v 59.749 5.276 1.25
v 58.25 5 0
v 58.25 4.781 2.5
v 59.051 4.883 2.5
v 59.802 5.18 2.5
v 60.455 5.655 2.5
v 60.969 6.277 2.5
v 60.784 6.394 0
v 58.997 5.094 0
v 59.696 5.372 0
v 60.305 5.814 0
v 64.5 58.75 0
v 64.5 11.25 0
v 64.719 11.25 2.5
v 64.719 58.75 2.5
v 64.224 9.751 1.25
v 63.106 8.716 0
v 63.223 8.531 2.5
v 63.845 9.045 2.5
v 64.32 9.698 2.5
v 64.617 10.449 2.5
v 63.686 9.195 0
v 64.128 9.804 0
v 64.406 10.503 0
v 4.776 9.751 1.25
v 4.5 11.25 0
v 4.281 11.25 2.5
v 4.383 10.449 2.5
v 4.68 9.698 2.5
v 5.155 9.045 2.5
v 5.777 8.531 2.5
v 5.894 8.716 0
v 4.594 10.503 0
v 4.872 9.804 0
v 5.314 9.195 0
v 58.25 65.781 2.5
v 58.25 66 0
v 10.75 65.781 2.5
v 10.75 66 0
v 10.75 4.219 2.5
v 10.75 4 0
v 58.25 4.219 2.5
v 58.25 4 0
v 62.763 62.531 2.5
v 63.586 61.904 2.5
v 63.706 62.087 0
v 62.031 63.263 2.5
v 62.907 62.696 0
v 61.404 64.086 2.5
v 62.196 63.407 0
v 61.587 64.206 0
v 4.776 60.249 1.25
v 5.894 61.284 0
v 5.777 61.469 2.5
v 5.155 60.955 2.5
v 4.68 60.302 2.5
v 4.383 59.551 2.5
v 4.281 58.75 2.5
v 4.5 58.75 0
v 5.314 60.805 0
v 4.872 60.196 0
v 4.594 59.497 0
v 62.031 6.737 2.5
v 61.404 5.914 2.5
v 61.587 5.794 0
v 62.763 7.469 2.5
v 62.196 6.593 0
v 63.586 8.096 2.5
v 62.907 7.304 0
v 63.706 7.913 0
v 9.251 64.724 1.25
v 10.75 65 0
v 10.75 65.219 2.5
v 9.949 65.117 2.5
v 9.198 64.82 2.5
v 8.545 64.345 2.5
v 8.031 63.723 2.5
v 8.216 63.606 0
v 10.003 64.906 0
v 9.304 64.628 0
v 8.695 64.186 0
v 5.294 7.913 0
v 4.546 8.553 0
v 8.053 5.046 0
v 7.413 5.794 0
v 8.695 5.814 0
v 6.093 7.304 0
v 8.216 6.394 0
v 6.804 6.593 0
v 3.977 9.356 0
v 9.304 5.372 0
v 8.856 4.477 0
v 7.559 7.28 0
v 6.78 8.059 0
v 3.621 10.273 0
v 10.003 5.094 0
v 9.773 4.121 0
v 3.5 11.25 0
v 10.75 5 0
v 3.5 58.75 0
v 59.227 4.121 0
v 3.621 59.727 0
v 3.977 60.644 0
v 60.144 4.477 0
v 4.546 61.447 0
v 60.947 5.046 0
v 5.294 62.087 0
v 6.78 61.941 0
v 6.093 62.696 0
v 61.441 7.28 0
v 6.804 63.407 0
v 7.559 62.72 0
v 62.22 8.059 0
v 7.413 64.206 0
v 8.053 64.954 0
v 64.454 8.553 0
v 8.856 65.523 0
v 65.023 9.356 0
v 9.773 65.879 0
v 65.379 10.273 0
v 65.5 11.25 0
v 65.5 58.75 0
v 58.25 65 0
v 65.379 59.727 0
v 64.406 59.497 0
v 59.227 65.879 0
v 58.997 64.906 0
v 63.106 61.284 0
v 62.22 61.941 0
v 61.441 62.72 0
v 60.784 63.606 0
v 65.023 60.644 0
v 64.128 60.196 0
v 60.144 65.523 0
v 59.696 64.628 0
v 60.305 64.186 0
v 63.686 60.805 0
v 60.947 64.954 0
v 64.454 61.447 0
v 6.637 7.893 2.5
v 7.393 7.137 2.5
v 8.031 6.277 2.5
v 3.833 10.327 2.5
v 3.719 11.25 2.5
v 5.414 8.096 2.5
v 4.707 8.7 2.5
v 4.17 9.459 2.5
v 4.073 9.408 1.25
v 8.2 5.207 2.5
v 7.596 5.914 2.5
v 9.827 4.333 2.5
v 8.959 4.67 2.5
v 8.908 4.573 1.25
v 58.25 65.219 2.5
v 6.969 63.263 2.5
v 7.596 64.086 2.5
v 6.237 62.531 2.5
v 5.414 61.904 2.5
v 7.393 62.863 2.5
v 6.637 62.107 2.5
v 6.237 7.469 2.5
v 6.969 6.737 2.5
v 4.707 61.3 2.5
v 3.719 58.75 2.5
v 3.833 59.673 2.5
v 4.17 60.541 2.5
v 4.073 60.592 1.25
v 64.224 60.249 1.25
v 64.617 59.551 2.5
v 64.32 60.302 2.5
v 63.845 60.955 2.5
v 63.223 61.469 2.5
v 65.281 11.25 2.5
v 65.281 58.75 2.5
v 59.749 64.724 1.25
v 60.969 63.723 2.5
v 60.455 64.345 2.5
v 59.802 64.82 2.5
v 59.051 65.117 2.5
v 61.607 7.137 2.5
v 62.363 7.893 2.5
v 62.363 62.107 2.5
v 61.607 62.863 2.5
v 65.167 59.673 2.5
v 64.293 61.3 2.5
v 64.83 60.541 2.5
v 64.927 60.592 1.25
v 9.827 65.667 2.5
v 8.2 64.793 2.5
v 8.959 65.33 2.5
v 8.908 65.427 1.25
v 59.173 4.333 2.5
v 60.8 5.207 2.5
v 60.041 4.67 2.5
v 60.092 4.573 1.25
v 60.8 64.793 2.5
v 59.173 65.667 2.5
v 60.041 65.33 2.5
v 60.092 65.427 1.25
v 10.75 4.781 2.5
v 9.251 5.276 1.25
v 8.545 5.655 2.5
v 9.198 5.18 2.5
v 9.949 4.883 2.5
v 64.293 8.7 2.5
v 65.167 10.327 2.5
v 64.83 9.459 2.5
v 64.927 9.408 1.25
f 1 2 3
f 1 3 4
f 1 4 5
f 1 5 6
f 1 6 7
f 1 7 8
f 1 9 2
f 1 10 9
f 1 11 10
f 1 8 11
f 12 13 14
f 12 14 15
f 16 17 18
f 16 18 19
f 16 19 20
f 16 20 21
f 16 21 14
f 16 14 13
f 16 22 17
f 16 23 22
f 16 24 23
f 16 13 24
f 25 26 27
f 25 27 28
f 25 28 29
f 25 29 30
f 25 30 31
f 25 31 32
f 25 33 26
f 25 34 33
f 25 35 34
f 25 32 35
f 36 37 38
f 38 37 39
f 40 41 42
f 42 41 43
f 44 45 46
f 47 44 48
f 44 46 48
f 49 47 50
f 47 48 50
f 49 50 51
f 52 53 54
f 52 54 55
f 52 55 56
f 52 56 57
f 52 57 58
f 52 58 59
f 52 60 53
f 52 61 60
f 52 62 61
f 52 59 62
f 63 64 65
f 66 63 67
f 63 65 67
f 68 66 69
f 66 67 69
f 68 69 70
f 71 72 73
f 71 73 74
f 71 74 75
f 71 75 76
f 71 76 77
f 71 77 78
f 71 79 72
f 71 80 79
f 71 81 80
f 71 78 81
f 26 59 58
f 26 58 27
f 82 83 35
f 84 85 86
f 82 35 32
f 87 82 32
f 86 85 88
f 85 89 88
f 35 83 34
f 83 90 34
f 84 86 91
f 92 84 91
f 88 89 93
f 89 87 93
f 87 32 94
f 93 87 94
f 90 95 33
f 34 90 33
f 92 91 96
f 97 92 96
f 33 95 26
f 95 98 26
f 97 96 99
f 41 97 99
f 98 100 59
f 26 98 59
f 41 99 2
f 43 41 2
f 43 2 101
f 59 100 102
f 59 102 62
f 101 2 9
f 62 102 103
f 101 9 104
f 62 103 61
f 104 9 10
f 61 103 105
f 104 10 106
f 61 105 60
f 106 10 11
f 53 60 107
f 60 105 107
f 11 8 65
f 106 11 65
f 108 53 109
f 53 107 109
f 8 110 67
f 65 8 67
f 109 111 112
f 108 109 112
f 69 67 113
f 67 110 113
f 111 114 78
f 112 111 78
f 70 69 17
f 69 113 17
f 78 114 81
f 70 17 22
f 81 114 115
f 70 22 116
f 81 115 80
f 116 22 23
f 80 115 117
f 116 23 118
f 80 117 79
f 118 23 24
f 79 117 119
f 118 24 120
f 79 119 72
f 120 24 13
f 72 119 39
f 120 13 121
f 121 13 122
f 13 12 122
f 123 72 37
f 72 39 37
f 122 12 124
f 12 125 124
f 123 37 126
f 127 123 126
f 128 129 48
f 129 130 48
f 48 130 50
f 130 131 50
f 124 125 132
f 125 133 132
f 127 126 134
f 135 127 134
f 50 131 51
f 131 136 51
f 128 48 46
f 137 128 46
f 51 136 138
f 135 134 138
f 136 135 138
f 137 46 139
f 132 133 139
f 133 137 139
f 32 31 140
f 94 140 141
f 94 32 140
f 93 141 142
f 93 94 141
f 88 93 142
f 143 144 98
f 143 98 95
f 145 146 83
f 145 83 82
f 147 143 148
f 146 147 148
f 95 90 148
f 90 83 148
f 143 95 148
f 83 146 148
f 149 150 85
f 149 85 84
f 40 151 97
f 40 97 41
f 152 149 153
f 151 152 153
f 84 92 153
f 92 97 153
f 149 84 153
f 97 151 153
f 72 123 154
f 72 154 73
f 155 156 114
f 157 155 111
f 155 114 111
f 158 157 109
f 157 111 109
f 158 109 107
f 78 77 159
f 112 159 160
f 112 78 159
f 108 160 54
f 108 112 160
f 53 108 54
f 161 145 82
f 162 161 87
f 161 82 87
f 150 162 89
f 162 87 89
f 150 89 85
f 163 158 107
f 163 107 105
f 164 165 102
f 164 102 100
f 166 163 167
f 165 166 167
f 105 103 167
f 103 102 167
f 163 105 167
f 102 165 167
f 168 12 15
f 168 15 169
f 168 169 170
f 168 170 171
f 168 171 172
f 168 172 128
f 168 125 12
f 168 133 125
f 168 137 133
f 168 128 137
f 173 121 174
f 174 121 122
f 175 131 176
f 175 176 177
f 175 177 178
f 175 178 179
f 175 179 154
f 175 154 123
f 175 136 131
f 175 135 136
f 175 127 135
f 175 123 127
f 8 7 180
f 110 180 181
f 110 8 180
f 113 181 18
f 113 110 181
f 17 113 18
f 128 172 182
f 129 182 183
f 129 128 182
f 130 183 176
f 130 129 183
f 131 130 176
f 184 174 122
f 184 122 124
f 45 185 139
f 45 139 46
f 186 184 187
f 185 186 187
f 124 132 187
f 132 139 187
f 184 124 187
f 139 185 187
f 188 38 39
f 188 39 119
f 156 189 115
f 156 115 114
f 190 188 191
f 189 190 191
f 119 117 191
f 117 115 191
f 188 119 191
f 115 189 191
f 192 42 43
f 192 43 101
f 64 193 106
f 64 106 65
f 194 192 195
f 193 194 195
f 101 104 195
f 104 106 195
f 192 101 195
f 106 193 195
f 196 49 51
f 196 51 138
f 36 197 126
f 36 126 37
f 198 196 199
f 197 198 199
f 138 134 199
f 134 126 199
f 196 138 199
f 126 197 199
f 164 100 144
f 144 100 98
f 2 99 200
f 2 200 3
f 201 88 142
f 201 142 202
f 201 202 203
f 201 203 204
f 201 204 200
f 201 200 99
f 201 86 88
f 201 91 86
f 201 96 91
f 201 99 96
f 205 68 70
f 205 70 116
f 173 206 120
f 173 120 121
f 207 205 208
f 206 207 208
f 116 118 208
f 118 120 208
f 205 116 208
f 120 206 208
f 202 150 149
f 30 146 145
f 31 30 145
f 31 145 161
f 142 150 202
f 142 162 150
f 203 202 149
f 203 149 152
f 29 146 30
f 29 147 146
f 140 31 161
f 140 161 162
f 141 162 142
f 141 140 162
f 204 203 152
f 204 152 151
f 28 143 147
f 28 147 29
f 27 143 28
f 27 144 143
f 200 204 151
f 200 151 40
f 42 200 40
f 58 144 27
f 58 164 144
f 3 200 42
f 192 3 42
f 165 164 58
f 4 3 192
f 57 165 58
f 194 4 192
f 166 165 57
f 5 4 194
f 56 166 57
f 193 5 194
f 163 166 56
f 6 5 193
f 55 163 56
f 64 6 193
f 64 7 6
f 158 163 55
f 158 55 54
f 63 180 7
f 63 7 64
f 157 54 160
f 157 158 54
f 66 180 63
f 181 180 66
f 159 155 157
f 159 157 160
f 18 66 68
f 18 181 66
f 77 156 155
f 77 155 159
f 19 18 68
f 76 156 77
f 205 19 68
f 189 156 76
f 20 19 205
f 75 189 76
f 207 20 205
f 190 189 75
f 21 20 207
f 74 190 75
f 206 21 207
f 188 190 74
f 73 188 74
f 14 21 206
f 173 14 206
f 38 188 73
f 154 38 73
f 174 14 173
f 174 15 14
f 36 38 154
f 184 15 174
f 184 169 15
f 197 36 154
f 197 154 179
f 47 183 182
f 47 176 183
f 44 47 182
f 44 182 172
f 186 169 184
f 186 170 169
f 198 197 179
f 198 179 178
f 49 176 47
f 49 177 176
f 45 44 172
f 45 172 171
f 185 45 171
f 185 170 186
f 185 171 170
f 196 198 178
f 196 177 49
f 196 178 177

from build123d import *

# Parameters (mm, degrees)
BOSS_EXTRUDE1_DEPTH = 2.5
BOSS_EXTRUDE1_DRAFT = 5


with BuildPart() as part:
    # Sketch1 → Boss-Extrude1 (with draft: the straight prism first)
    with BuildSketch(Plane.XY):
        with BuildLine():
            Line((65.5, 11.25), (65.5, 58.75))
            ThreePointArc((65.5, 58.75), (65.023112089, 60.644117527), (63.706159397, 62.086594179))
            ThreePointArc((63.706159397, 62.086594179), (62.539407406, 63.039407406), (61.586594179, 64.206159397))
            ThreePointArc((61.586594179, 64.206159397), (60.144117527, 65.523112089), (58.25, 66))
            Line((58.25, 66), (10.75, 66))
            ThreePointArc((10.75, 66), (8.855882473, 65.523112089), (7.413405821, 64.206159397))
            ThreePointArc((7.413405821, 64.206159397), (6.460592594, 63.039407406), (5.293840603, 62.086594179))
            ThreePointArc((5.293840603, 62.086594179), (3.976887911, 60.644117527), (3.5, 58.75))
            Line((3.5, 58.75), (3.5, 11.25))
            ThreePointArc((3.5, 11.25), (3.976887911, 9.355882473), (5.293840603, 7.913405821))
            ThreePointArc((5.293840603, 7.913405821), (6.460592594, 6.960592594), (7.413405821, 5.793840603))
            ThreePointArc((7.413405821, 5.793840603), (8.855882473, 4.476887911), (10.75, 4))
            Line((10.75, 4), (58.25, 4))
            ThreePointArc((58.25, 4), (60.144117527, 4.476887911), (61.586594179, 5.793840603))
            ThreePointArc((61.586594179, 5.793840603), (62.539407406, 6.960592594), (63.706159397, 7.913405821))
            ThreePointArc((63.706159397, 7.913405821), (65.023112089, 9.355882473), (65.5, 11.25))
        make_face()
        with BuildLine():
            Line((64.5, 11.25), (64.5, 58.75))
            ThreePointArc((64.5, 58.75), (64.128384354, 60.196235004), (63.105602876, 61.284174304))
            ThreePointArc((63.105602876, 61.284174304), (61.816309207, 62.316309207), (60.784174304, 63.605602876))
            ThreePointArc((60.784174304, 63.605602876), (59.696235004, 64.628384354), (58.25, 65))
            Line((58.25, 65), (10.75, 65))
            ThreePointArc((10.75, 65), (9.303764996, 64.628384354), (8.215825696, 63.605602876))
            ThreePointArc((8.215825696, 63.605602876), (7.183690793, 62.316309207), (5.894397124, 61.284174304))
            ThreePointArc((5.894397124, 61.284174304), (4.871615646, 60.196235004), (4.5, 58.75))
            Line((4.5, 58.75), (4.5, 11.25))
            ThreePointArc((4.5, 11.25), (4.871615646, 9.803764996), (5.894397124, 8.715825696))
            ThreePointArc((5.894397124, 8.715825696), (7.183690793, 7.683690793), (8.215825696, 6.394397124))
            ThreePointArc((8.215825696, 6.394397124), (9.303764996, 5.371615646), (10.75, 5))
            Line((10.75, 5), (58.25, 5))
            ThreePointArc((58.25, 5), (59.696235004, 5.371615646), (60.784174304, 6.394397124))
            ThreePointArc((60.784174304, 6.394397124), (61.816309207, 7.683690793), (63.105602876, 8.715825696))
            ThreePointArc((63.105602876, 8.715825696), (64.128384354, 9.803764996), (64.5, 11.25))
        make_face(mode=Mode.SUBTRACT)
    extrude(amount=BOSS_EXTRUDE1_DEPTH)
    # Boss-Extrude1: the draft: its side faces are tilted about the plane it starts from
    boss_extrude1_sides = [part.faces().sort_by_distance(p)[0] for p in [
        (65.023112089, 9.355882473, 1.25),
        (65.5, 35, 1.25),
        (65.023112089, 60.644117527, 1.25),
        (62.539407406, 63.039407406, 1.25),
        (60.144117527, 65.523112089, 1.25),
        (34.5, 66, 1.25),
        (8.855882473, 65.523112089, 1.25),
        (6.460592594, 63.039407406, 1.25),
        (3.976887911, 60.644117527, 1.25),
        (3.5, 35, 1.25),
        (3.976887911, 9.355882473, 1.25),
        (6.460592594, 6.960592594, 1.25),
        (8.855882473, 4.476887911, 1.25),
        (34.5, 4, 1.25),
        (60.144117527, 4.476887911, 1.25),
        (62.539407406, 6.960592594, 1.25),
        (7.183690793, 7.683690793, 1.25),
        (4.871615646, 9.803764996, 1.25),
        (4.5, 35, 1.25),
        (4.871615646, 60.196235004, 1.25),
        (7.183690793, 62.316309207, 1.25),
        (9.303764996, 64.628384354, 1.25),
        (34.5, 65, 1.25),
        (59.696235004, 64.628384354, 1.25),
        (61.816309207, 62.316309207, 1.25),
        (64.128384354, 60.196235004, 1.25),
        (64.5, 35, 1.25),
        (64.128384354, 9.803764996, 1.25),
        (61.816309207, 7.683690793, 1.25),
        (59.696235004, 5.371615646, 1.25),
        (34.5, 5, 1.25),
        (9.303764996, 5.371615646, 1.25),
    ]]
    draft(boss_extrude1_sides, Plane.XY, BOSS_EXTRUDE1_DRAFT)


solid = part.part
